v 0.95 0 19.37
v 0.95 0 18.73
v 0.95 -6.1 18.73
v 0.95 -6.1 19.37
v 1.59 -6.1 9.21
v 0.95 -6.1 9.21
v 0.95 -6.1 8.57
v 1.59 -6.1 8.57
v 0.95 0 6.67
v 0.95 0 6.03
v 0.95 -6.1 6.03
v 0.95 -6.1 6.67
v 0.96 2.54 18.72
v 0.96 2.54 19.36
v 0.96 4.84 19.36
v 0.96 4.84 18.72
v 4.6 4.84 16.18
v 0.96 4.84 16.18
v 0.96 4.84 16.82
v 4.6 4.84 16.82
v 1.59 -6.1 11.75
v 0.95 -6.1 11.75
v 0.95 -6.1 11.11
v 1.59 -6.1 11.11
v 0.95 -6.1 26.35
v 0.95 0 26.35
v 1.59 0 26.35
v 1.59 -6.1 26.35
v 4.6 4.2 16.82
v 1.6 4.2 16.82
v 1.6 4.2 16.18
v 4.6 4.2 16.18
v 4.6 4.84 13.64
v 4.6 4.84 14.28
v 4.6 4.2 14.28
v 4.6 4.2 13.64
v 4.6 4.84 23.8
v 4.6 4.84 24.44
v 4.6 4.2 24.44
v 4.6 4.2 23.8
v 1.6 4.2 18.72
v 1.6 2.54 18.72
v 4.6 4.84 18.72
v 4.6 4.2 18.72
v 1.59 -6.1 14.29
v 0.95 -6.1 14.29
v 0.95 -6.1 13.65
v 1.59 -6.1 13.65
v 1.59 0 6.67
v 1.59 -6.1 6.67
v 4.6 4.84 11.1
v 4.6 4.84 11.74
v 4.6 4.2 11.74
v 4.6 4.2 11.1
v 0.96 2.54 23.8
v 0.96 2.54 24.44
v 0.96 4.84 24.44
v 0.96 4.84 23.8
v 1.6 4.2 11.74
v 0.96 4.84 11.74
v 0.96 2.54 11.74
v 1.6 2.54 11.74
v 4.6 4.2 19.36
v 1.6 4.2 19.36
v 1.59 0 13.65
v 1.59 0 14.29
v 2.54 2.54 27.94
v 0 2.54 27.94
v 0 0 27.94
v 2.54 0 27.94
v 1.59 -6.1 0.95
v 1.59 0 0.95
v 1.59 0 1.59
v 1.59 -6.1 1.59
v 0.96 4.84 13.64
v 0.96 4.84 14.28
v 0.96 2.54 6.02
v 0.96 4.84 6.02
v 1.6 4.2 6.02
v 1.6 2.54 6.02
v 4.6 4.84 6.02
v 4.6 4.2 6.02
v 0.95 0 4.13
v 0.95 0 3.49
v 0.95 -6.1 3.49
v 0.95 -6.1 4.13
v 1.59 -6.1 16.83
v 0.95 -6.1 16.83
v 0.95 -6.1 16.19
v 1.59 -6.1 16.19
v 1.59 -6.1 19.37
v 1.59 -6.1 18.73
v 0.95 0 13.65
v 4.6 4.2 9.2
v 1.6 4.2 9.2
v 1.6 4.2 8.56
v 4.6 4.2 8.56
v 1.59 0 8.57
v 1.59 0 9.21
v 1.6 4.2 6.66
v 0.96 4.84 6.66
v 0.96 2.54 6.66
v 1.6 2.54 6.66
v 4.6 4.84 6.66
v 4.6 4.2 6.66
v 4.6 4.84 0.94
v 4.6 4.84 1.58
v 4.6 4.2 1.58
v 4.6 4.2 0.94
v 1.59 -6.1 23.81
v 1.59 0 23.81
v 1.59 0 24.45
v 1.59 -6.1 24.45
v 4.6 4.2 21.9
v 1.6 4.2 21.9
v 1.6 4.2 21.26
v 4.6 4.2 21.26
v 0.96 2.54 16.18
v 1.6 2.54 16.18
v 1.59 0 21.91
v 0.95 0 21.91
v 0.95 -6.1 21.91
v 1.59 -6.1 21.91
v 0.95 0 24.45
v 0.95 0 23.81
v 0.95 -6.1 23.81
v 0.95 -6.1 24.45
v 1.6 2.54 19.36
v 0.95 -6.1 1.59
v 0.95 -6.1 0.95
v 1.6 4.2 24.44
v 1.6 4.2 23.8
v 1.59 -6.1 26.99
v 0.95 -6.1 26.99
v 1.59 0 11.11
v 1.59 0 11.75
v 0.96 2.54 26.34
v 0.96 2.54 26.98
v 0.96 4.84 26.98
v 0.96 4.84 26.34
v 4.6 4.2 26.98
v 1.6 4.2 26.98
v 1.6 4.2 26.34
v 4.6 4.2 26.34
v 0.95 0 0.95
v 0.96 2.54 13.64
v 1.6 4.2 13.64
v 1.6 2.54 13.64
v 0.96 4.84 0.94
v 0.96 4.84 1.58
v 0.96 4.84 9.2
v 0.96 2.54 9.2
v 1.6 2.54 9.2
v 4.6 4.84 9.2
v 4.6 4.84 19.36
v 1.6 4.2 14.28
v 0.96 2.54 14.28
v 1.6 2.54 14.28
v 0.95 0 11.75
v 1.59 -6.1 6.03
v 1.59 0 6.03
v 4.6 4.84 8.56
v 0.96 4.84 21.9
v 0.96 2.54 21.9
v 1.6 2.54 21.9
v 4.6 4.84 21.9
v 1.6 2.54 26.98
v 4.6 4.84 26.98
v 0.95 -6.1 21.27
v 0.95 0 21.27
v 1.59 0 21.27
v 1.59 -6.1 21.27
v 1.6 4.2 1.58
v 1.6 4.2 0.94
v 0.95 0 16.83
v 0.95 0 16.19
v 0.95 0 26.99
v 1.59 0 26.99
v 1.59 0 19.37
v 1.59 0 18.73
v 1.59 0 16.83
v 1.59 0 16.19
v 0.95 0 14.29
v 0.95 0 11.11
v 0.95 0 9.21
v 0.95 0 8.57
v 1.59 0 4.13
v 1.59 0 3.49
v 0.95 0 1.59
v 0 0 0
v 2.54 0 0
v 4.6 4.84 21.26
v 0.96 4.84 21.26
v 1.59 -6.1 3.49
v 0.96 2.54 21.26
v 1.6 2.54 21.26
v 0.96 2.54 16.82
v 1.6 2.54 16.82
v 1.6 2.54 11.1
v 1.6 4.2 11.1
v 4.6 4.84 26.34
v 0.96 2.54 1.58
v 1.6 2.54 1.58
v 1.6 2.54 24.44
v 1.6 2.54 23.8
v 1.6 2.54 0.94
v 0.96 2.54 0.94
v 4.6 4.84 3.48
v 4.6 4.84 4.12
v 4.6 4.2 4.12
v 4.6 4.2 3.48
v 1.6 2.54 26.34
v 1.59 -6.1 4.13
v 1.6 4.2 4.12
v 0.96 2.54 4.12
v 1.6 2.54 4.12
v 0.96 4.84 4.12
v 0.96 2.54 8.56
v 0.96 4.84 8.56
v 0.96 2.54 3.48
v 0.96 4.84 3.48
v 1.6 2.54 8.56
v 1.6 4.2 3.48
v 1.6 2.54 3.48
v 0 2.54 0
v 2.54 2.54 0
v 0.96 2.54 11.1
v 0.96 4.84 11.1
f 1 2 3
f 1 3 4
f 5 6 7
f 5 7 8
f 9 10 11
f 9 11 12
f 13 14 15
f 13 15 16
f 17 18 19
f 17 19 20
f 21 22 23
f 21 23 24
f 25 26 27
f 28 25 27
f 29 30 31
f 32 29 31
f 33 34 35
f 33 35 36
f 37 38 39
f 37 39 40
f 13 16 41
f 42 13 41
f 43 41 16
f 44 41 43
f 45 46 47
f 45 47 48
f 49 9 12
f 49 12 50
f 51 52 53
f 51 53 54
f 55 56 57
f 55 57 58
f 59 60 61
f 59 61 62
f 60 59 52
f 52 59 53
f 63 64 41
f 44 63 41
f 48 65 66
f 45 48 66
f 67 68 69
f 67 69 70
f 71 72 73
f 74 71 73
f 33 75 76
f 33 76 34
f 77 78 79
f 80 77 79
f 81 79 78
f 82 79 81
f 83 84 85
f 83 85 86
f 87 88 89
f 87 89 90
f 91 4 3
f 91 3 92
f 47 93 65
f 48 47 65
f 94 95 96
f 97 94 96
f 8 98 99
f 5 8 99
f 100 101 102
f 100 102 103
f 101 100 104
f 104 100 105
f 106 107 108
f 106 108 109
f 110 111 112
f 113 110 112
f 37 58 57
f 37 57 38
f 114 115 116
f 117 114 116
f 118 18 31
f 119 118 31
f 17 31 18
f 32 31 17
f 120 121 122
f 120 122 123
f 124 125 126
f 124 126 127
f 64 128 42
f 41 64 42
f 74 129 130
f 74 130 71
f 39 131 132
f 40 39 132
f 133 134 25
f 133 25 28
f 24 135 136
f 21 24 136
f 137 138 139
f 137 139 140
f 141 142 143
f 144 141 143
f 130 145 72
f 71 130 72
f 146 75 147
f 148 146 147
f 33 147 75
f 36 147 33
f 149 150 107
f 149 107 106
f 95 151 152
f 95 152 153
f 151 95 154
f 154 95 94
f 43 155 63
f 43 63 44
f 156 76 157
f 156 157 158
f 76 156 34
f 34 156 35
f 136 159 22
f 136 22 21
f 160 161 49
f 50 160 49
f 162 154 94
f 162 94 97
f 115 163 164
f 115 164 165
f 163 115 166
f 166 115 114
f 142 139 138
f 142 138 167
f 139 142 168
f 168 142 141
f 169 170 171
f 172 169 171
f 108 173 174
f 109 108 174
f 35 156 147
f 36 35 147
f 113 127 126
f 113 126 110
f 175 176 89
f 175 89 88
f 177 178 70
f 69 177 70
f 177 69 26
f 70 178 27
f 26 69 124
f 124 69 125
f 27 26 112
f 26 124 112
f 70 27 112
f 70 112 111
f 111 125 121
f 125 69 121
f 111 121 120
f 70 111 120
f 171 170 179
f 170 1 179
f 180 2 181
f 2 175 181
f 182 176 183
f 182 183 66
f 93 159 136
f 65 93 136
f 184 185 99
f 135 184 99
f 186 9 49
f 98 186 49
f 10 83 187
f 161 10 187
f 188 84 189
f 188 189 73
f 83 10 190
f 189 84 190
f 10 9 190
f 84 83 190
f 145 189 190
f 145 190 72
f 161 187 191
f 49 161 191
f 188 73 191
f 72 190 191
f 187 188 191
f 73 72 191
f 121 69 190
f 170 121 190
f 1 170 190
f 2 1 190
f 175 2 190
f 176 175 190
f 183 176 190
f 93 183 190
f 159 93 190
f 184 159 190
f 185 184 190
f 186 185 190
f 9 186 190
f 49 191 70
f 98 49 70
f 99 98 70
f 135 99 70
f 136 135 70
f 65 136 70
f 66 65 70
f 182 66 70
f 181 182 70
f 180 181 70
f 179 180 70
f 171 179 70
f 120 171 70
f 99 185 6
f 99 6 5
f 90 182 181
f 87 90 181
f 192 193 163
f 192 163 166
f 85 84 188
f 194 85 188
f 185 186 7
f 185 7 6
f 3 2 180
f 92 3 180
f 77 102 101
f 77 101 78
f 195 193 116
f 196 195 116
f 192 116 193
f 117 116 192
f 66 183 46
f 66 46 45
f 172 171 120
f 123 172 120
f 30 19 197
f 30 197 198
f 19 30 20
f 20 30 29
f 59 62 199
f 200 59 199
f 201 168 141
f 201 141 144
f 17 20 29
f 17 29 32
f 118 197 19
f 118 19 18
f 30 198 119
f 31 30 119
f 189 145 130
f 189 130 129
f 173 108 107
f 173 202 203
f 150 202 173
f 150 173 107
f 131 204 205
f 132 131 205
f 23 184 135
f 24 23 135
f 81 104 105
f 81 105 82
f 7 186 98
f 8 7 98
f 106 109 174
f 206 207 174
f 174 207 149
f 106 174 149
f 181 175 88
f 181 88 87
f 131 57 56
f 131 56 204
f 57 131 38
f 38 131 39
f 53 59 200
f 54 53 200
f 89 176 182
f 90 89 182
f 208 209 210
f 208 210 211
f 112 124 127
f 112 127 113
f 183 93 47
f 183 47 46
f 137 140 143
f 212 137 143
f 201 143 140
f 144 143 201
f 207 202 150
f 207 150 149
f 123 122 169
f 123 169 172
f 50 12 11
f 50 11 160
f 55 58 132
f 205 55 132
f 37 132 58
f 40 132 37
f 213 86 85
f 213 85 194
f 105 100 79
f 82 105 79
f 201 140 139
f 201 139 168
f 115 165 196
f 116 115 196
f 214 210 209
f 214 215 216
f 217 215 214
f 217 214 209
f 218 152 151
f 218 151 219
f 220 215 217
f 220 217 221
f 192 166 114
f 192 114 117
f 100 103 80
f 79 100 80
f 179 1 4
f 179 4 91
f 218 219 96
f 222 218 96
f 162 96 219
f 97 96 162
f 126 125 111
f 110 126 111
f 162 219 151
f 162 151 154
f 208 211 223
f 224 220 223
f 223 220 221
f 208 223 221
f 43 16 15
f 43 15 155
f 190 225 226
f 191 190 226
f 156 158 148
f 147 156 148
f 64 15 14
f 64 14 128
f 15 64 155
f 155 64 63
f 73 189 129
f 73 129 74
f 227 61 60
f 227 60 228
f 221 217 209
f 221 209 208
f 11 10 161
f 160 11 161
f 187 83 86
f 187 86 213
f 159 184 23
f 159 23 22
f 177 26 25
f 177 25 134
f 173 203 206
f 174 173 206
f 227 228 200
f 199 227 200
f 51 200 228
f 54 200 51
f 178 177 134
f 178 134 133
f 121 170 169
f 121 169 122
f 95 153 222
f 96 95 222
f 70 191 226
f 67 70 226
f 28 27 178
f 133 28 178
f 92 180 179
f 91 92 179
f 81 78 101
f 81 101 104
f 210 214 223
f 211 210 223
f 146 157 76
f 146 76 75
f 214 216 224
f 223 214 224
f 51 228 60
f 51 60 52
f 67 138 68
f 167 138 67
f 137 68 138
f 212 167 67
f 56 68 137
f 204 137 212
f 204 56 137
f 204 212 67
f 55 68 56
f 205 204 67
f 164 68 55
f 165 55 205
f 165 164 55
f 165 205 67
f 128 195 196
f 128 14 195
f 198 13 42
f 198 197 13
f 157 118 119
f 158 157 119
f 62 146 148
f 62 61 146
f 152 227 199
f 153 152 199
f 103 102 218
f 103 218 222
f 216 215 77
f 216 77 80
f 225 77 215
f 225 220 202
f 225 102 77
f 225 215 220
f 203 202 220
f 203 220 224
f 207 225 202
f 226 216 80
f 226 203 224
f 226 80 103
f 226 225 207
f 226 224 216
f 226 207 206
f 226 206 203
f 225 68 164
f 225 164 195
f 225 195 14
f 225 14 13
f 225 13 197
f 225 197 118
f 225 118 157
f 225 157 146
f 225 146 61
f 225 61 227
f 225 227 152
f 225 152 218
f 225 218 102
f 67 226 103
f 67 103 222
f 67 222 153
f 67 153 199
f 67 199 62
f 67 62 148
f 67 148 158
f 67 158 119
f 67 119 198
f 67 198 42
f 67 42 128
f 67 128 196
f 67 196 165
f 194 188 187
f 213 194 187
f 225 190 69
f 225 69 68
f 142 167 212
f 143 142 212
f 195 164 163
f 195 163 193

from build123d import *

# Parameters (mm, degrees)
SKETCH1_W           = 2.54
SKETCH1_H           = 2.54
BOSS_EXTRUDE1_DEPTH = 27.94
SKETCH2_W           = 0.64
SKETCH2_H           = 0.64
BOSS_EXTRUDE2_DEPTH = 6.1
LPATTERN1_COUNT     = 11
LPATTERN1_PITCH     = 2.54
SKETCH3_W           = 0.64
SKETCH3_H           = 0.64
BOSS_EXTRUDE3_DEPTH = 2.3
LPATTERN2_COUNT     = 11
LPATTERN2_PITCH     = 2.54
SKETCH4_W           = 0.64
SKETCH4_H           = 0.64
BOSS_EXTRUDE4_DEPTH = 3
LPATTERN3_COUNT     = 11
LPATTERN3_PITCH     = 2.54


with BuildPart() as part:
    # Sketch1 → Boss-Extrude1 (new body)
    with BuildSketch(Plane.XY):
        with Locations((1.27, 1.27)):
            Rectangle(SKETCH1_W, SKETCH1_H)
    extrude(amount=BOSS_EXTRUDE1_DEPTH)

    # Sketch2 → Boss-Extrude2 (add)
    with BuildSketch(Plane.XZ):
        with Locations((1.27, 26.67)):
            Rectangle(SKETCH2_W, SKETCH2_H)
    boss_extrude2 = extrude(amount=BOSS_EXTRUDE2_DEPTH)

    # LPattern1: Boss-Extrude2 ×11
    with Locations(*[(0, 0, -i * LPATTERN1_PITCH) for i in range(1, LPATTERN1_COUNT)]):
        add(boss_extrude2)

    # Sketch3 → Boss-Extrude3 (add)
    with BuildSketch(Plane(origin=(0, 2.54, 0), x_dir=(1, 0, 0), z_dir=(0, 1, 0))):
        with Locations((1.28, -1.26)):
            Rectangle(SKETCH3_W, SKETCH3_H)
    boss_extrude3 = extrude(amount=BOSS_EXTRUDE3_DEPTH)

    # LPattern2: Boss-Extrude3 ×11
    with Locations(*[(0, 0, i * LPATTERN2_PITCH) for i in range(1, LPATTERN2_COUNT)]):
        add(boss_extrude3)

    # Sketch4 → Boss-Extrude4 (add)
    with BuildSketch(Plane(origin=(1.6, 0, 0), x_dir=(0, 0, -1), z_dir=(1, 0, 0))):
        with Locations((-1.26, 4.52)):
            Rectangle(SKETCH4_W, SKETCH4_H)
    boss_extrude4 = extrude(amount=BOSS_EXTRUDE4_DEPTH)

    # LPattern3: Boss-Extrude4 ×11
    with Locations(*[(0, 0, i * LPATTERN3_PITCH) for i in range(1, LPATTERN3_COUNT)]):
        add(boss_extrude4)


solid = part.part
